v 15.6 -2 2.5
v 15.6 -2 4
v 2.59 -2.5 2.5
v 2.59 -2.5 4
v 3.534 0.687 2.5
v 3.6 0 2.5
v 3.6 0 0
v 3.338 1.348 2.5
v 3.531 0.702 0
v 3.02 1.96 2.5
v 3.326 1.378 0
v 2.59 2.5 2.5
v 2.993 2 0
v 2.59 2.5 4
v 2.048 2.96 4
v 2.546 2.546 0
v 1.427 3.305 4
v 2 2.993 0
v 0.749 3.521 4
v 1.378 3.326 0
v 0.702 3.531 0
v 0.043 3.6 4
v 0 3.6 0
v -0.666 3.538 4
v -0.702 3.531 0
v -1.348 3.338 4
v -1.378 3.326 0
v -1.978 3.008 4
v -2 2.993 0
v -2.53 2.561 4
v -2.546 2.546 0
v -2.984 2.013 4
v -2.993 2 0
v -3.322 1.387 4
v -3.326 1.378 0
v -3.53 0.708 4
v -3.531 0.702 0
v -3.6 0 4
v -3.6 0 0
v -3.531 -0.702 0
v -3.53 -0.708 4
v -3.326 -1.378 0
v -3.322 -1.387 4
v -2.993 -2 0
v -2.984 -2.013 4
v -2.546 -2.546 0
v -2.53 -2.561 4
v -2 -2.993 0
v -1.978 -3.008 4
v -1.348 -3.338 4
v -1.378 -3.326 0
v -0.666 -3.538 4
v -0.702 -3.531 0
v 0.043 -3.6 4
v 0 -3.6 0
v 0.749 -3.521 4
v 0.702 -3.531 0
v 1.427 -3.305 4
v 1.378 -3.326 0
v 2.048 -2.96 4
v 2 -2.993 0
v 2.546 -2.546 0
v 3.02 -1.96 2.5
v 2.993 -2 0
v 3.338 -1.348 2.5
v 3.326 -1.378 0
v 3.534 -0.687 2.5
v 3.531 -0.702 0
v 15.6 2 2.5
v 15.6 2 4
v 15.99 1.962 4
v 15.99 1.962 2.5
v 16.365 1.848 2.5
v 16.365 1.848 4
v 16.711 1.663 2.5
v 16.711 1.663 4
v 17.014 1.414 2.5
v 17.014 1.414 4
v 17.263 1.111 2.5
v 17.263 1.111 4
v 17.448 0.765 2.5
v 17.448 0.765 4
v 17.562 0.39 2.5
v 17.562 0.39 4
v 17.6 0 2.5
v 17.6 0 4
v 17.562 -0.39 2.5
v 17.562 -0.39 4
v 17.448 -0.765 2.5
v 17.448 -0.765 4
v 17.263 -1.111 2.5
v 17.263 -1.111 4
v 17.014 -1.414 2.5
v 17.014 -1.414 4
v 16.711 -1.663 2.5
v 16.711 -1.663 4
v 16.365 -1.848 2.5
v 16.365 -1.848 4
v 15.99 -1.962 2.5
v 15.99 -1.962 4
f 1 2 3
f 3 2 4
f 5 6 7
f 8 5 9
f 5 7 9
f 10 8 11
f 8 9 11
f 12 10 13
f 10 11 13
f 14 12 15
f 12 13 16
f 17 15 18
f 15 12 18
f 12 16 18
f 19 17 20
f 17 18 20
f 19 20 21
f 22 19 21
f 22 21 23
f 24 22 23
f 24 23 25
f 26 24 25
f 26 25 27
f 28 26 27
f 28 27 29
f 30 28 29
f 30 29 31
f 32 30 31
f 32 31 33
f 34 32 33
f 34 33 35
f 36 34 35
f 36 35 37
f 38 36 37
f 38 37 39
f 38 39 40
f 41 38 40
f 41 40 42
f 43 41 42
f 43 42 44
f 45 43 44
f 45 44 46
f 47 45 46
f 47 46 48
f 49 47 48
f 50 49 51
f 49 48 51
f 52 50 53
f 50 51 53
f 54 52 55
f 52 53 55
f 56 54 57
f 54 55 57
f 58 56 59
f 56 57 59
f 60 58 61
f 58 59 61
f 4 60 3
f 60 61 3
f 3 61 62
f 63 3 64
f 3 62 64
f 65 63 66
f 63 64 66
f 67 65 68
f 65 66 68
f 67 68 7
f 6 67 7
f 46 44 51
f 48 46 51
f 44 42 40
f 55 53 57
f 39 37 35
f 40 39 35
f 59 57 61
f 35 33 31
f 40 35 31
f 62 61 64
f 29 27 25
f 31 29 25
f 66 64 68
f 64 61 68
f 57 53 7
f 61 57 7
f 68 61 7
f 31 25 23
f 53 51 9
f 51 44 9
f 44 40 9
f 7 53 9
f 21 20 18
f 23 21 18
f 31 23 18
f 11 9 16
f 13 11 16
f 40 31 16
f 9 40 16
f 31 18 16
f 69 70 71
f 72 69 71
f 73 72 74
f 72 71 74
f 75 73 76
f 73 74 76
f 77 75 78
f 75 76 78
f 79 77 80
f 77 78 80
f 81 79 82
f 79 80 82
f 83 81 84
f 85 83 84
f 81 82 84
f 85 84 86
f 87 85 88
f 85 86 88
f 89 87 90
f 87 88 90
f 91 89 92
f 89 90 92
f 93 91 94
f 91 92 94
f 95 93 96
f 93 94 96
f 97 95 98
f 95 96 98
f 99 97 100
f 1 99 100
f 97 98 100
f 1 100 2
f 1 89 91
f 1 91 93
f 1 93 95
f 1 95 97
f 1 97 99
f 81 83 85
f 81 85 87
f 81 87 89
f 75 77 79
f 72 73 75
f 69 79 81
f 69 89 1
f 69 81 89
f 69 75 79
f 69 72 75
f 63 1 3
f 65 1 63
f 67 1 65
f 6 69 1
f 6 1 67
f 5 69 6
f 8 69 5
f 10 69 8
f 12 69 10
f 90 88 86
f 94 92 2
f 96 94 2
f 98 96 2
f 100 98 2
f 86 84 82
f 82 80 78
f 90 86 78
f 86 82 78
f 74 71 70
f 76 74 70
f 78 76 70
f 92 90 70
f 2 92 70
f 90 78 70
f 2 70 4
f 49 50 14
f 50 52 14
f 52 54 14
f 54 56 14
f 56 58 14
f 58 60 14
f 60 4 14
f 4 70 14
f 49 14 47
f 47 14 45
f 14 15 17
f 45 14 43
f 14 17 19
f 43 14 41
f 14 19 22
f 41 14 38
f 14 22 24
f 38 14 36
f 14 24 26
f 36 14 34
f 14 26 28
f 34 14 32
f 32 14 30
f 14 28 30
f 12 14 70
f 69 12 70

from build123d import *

# Parameters (mm, degrees)
SKETCH_1_R      = 3.6
EXTRUDE_1_DEPTH = 4
EXTRUDE_2_DEPTH = 1.5


with BuildPart() as part:
    # 草图1 → 凸台-拉伸1 (new body)
    with BuildSketch(Plane.XY):
        Circle(SKETCH_1_R)
    extrude(amount=EXTRUDE_1_DEPTH)

    # 草图2 → 凸台-拉伸2 (add)
    with BuildSketch(Plane.XY.offset(4)):
        with BuildLine():
            Line((2.590366769, 2.5), (15.6, 2))
            ThreePointArc((15.6, 2), (17.6, 0), (15.6, -2))
            Line((15.6, -2), (2.590366769, -2.5))
            Line((2.590366769, -2.5), (2.590366769, 2.5))
        make_face()
    extrude(amount=-EXTRUDE_2_DEPTH)


solid = part.part
